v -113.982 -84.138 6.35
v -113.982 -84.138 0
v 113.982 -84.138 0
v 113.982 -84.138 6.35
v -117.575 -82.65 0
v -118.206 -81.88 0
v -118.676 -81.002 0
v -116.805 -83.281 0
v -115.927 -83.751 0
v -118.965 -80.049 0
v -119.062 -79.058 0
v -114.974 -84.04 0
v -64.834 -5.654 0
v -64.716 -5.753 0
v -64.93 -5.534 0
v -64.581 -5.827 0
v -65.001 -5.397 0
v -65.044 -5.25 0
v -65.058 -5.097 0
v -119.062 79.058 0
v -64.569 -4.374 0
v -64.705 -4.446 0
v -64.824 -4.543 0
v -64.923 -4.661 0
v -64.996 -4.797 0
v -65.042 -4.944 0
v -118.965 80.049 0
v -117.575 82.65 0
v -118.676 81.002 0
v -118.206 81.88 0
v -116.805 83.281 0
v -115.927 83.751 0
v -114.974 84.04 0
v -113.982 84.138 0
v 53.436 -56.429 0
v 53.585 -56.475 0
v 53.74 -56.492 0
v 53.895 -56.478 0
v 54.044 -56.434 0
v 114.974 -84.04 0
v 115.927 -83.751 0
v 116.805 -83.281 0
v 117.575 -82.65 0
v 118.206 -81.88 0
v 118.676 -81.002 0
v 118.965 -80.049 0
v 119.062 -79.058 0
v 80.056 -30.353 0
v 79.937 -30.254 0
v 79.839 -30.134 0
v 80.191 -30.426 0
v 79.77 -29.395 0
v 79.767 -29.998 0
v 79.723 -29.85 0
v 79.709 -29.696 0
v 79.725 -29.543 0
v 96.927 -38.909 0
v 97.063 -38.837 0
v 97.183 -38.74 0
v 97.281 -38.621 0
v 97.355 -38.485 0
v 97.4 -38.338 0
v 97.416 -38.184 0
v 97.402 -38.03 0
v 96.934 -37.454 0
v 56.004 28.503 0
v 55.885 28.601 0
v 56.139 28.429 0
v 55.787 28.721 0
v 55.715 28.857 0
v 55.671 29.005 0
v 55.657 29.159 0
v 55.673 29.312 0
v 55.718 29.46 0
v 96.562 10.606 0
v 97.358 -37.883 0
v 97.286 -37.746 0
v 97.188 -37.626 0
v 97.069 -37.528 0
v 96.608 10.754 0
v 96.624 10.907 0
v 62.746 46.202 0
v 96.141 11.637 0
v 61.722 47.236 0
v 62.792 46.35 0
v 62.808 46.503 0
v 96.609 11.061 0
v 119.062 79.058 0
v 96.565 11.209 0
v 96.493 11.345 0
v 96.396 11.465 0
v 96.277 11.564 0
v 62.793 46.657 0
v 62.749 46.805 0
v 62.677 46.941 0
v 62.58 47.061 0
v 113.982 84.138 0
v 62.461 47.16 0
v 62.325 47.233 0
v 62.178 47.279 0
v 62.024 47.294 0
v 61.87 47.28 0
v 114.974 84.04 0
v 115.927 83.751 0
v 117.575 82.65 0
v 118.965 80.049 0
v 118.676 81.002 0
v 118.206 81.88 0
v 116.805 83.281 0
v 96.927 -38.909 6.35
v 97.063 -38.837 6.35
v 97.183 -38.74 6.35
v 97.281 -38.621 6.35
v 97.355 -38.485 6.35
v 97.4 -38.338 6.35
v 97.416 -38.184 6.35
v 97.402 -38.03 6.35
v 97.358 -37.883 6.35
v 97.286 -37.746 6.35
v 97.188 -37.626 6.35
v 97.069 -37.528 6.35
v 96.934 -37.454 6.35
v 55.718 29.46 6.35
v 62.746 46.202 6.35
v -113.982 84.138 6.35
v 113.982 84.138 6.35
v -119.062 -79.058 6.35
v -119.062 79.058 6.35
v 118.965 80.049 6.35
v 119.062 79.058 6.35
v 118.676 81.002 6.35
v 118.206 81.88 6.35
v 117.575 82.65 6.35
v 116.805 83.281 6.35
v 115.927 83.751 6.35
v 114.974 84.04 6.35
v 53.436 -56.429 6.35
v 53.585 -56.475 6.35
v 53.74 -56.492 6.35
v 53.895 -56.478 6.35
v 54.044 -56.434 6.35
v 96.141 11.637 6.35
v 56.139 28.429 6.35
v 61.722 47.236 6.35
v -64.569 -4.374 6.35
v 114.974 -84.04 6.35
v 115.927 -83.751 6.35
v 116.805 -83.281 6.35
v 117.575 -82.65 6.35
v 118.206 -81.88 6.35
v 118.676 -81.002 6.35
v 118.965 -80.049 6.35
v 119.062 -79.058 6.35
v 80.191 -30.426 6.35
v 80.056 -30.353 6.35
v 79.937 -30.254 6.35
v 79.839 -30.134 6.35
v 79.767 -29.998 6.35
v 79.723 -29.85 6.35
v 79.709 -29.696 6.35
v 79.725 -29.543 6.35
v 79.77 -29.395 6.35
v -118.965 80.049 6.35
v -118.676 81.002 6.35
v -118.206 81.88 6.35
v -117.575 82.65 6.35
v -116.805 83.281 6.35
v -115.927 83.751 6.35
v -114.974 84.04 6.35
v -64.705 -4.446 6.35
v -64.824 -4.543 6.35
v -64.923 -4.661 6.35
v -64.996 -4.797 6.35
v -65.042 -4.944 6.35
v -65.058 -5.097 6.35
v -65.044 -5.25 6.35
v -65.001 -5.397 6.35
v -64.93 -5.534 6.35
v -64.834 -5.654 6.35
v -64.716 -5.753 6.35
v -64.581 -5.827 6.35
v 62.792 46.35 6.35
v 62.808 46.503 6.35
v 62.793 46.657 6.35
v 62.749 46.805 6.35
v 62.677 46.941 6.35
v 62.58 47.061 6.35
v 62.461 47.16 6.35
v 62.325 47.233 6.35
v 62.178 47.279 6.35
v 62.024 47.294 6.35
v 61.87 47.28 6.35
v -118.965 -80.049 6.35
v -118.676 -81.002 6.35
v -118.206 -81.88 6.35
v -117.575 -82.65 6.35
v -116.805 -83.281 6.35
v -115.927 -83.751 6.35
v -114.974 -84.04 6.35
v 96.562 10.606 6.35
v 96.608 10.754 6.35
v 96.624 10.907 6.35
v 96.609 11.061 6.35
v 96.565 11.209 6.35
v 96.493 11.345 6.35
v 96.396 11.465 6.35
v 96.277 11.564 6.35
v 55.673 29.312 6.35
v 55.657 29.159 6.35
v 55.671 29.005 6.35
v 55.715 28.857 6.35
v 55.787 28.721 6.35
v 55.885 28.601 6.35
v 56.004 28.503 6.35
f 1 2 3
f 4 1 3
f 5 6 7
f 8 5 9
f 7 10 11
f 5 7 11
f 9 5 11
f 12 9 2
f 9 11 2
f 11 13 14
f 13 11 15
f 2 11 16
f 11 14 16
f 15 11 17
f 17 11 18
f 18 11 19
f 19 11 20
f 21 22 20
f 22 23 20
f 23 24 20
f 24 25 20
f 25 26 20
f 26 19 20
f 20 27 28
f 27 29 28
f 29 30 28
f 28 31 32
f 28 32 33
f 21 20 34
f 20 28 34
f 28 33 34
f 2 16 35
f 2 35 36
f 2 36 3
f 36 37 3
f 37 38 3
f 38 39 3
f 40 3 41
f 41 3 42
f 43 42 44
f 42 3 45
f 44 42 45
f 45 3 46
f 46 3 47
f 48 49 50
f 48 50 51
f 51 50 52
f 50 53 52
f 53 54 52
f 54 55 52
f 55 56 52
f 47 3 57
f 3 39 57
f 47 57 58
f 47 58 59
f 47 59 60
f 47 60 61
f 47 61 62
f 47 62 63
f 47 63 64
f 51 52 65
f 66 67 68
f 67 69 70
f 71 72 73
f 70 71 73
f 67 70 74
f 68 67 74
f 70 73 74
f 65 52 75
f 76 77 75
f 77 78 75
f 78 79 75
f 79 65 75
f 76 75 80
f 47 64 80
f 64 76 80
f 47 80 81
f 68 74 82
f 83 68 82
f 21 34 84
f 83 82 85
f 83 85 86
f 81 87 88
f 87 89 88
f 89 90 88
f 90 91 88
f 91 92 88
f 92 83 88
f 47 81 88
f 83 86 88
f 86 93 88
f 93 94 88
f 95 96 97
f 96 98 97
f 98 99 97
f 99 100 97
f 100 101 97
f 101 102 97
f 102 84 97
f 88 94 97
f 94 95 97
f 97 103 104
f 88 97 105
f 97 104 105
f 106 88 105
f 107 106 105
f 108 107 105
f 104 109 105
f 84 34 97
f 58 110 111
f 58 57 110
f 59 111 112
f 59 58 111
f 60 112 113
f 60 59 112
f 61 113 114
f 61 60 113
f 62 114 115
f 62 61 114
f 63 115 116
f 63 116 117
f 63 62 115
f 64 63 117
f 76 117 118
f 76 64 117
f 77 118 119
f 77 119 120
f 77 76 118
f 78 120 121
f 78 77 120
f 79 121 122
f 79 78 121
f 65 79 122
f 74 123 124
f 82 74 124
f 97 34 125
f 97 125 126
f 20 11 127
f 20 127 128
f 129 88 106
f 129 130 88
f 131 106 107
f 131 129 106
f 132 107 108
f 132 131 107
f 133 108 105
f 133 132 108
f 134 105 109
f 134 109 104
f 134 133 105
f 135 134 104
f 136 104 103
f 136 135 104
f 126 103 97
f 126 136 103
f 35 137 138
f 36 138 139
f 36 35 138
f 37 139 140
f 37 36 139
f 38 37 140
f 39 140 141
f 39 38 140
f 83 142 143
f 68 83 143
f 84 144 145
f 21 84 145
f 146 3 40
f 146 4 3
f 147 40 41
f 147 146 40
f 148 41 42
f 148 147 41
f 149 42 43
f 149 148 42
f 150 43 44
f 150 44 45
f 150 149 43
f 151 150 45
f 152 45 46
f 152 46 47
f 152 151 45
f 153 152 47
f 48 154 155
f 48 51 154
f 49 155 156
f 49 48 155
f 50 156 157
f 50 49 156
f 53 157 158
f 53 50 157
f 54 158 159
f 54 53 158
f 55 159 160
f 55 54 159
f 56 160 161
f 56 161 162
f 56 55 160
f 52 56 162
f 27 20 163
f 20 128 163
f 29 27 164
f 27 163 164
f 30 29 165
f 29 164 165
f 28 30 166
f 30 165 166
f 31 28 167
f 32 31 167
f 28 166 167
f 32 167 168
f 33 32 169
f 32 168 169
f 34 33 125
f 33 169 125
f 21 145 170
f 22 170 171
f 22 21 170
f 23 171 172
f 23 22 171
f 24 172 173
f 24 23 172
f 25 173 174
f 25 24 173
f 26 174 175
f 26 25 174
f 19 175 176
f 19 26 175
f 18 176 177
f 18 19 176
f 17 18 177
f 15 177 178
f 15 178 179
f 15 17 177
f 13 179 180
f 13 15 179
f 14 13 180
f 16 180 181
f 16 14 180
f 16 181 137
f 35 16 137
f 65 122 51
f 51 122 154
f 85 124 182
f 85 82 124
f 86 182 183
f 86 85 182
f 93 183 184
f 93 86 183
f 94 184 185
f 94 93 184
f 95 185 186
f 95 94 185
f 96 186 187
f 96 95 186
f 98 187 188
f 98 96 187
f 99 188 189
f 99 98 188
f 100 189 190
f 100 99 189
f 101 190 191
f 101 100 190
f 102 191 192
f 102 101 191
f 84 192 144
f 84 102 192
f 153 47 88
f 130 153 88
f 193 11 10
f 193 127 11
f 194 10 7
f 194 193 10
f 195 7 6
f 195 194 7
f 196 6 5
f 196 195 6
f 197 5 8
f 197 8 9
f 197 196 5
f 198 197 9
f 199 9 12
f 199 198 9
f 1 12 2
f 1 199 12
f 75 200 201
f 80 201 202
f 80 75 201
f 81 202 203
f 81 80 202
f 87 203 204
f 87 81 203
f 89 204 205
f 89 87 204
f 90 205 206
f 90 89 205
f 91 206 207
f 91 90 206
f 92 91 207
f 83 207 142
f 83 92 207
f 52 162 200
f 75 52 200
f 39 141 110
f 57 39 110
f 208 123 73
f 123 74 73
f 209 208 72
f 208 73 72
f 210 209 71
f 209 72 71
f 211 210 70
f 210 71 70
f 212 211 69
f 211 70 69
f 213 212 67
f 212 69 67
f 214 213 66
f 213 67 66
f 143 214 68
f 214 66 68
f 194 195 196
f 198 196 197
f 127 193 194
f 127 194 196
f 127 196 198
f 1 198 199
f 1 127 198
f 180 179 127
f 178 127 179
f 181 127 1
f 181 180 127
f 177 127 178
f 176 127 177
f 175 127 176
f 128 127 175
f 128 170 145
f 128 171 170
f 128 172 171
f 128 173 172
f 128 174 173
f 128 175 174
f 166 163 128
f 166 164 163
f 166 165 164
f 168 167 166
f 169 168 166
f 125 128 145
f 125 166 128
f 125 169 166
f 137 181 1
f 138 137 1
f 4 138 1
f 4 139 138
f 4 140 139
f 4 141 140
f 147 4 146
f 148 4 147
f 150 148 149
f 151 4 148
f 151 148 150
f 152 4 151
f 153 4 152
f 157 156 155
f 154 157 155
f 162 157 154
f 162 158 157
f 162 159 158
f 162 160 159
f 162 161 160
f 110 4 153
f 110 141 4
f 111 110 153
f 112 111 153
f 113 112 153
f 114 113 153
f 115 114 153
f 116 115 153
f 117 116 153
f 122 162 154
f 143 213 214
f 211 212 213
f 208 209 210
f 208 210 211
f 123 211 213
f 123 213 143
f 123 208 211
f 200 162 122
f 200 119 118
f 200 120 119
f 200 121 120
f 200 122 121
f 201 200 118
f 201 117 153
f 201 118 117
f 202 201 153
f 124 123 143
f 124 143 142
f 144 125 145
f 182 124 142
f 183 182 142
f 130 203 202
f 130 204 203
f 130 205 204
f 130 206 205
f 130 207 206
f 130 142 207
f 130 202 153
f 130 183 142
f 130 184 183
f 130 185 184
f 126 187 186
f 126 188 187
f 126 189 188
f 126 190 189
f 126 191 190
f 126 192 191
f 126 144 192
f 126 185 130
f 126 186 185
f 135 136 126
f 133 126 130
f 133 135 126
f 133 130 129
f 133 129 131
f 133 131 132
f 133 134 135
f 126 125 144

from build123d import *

# Parameters (mm, degrees)
F0_W     = 238.125
F0_H     = 168.275
F1_DEPTH = 6.35
F2_R     = 5.08
F4_DEPTH = 25.4
F6_DEPTH = 25.4
F7_R     = 0.7874


with BuildPart() as f1:
    # F0 (on Top) → F1 (new body)
    with BuildSketch(Plane.XY):
        Rectangle(F0_W, F0_H)
    extrude(amount=F1_DEPTH)

    # F2
    f2_edges = [f1.edges().sort_by_distance(p)[0] for p in [
        (-119.0625, 84.1375, 3.175),
        (-119.0625, -84.1375, 3.175),
        (119.0625, 84.1375, 3.175),
        (119.0625, -84.1375, 3.175),
    ]]
    fillet(f2_edges, radius=F2_R)

    # F3 (on face) → F4 (cut)
    with BuildSketch(Plane.XY.offset(6.35)):
        Polygon((-63.021223, -5.113947), (53.750796, -55.181694), (95.367796, -38.174427), (77.802704, -30.800822), (95.204413, 10.652795), (53.750796, 28.054503), (61.124402, 45.619595), align=None)
    extrude(amount=-F4_DEPTH, mode=Mode.SUBTRACT)

    # F5 (on face) → F6 (cut)
    with BuildSketch(Plane.XY.offset(6.35)):
        Polygon((55.413376, 28.733936), (63.482172, 47.95508), (-66.309597, -5.085824), (53.739022, -56.558461), (98.686428, -38.190185), (79.465284, -30.121389), (96.866992, 11.332227), align=None)
    extrude(amount=-F6_DEPTH, mode=Mode.SUBTRACT)

    # F7
    f7_edges = [f1.edges().sort_by_distance(p)[0] for p in [
        (-66.309597, -5.085824, 3.175),
        (63.482172, 47.95508, 3.175),
        (96.866992, 11.332227, 3.175),
        (55.413376, 28.733936, 3.175),
        (79.465284, -30.121389, 3.175),
        (98.686428, -38.190185, 3.175),
        (53.739022, -56.558461, 3.175),
    ]]
    fillet(f7_edges, radius=F7_R)


solid = f1.part
